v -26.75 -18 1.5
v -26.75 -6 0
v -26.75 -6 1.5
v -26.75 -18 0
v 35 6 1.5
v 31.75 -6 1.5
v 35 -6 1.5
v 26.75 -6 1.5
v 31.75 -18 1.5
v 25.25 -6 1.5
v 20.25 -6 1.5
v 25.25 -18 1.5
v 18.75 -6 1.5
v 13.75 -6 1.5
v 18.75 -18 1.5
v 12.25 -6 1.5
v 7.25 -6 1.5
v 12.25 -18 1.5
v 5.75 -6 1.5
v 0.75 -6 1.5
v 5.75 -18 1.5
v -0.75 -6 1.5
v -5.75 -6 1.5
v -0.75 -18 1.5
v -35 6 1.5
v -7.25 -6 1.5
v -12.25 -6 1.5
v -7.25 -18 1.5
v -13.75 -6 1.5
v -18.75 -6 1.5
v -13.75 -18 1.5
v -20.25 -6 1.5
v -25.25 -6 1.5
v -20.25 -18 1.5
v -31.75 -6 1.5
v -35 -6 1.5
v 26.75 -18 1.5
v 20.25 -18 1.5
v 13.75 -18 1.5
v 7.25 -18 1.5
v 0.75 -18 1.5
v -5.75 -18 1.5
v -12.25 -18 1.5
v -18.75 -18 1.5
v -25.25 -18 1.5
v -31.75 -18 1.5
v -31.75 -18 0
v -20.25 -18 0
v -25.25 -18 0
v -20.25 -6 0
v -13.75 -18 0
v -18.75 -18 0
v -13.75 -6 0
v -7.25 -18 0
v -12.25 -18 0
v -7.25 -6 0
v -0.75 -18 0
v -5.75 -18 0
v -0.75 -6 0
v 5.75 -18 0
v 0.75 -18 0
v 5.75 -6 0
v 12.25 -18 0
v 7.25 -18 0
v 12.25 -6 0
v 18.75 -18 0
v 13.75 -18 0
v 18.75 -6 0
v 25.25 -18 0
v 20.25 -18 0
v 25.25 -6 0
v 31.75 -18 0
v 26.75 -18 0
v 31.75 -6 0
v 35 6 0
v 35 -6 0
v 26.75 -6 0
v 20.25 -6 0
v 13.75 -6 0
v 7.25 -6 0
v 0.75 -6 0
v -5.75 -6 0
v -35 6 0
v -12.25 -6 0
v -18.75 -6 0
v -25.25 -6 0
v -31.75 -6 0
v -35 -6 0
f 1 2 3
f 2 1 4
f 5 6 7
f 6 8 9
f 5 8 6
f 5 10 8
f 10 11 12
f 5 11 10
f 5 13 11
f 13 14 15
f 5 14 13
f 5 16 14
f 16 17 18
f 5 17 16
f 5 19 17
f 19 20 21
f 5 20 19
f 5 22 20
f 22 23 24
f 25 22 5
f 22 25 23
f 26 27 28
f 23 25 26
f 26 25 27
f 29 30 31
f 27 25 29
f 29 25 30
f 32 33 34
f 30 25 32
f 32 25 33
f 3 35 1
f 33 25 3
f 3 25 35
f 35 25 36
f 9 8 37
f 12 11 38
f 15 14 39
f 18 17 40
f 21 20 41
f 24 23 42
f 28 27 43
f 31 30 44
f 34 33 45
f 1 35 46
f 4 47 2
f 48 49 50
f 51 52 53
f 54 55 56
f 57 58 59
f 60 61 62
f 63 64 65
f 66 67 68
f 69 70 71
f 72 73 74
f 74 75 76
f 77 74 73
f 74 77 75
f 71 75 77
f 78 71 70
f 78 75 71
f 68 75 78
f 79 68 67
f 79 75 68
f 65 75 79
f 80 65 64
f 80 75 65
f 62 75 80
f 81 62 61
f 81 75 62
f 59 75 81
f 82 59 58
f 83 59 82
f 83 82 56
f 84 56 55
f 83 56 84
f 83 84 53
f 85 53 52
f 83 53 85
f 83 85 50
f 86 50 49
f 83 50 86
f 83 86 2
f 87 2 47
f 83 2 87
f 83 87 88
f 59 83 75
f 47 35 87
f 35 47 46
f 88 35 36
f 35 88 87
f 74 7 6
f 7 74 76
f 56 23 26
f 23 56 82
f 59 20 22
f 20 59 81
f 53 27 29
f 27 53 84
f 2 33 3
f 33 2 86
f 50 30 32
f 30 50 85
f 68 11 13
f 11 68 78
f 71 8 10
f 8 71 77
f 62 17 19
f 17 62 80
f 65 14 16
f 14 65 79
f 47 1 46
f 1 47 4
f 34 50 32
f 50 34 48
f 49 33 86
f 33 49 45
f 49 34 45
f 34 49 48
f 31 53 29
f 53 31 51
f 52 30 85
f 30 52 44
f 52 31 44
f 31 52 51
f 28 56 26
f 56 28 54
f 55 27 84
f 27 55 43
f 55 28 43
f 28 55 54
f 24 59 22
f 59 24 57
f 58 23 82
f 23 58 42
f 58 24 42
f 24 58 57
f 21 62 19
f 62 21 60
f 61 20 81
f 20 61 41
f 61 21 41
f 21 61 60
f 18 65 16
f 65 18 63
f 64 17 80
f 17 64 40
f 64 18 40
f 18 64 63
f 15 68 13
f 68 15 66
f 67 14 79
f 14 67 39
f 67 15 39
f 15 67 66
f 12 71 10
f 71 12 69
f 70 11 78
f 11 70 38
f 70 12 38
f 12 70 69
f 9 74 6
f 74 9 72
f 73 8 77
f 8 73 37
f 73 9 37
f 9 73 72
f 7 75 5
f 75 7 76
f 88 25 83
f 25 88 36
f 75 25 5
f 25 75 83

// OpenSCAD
// Parameters (mm)
thickness = 1.5;          // Plate thickness
spine_length = 70;       // Length of the back bar (X direction)
spine_width = 12;        // Width of the back bar (Y direction)
tooth_width = 5.0;        // Width of each tooth (X direction)
tooth_length = 12;       // Length of each tooth (Y direction, extends -Y)
gap = 1.5;               // Gap between neighbouring teeth (X direction)
num_teeth = 10;         // Number of teeth

// Derived values
total_tooth_span = num_teeth*tooth_width + (num_teeth-1)*gap; // total X span of teeth+gaps
offset_x = (spine_length - total_tooth_span)/2;               // X offset to centre teeth on spine
y_center_tooth = -(spine_width/2 + tooth_length/2);        // Y centre of a tooth (extends -Y)
fn = 64;               // resolution for circles/cylinders

// Main model (lies flat on the build plate, bottom at Z=0)
translate([0,0,thickness/2])  // lift everything so bottom is at Z=0
union() {
    // Spine (back bar)
    cube([spine_length, spine_width, thickness], center=true);
    
    // Teeth
    for (i = [0 : num_teeth-1]) {
        // X centre of the i‑th tooth
        x_center = -spine_length/2 + offset_x + tooth_width/2 + i*(tooth_width + gap);
        translate([x_center, y_center_tooth, 0])
            cube([tooth_width, tooth_length, thickness], center=true);
    }
}
